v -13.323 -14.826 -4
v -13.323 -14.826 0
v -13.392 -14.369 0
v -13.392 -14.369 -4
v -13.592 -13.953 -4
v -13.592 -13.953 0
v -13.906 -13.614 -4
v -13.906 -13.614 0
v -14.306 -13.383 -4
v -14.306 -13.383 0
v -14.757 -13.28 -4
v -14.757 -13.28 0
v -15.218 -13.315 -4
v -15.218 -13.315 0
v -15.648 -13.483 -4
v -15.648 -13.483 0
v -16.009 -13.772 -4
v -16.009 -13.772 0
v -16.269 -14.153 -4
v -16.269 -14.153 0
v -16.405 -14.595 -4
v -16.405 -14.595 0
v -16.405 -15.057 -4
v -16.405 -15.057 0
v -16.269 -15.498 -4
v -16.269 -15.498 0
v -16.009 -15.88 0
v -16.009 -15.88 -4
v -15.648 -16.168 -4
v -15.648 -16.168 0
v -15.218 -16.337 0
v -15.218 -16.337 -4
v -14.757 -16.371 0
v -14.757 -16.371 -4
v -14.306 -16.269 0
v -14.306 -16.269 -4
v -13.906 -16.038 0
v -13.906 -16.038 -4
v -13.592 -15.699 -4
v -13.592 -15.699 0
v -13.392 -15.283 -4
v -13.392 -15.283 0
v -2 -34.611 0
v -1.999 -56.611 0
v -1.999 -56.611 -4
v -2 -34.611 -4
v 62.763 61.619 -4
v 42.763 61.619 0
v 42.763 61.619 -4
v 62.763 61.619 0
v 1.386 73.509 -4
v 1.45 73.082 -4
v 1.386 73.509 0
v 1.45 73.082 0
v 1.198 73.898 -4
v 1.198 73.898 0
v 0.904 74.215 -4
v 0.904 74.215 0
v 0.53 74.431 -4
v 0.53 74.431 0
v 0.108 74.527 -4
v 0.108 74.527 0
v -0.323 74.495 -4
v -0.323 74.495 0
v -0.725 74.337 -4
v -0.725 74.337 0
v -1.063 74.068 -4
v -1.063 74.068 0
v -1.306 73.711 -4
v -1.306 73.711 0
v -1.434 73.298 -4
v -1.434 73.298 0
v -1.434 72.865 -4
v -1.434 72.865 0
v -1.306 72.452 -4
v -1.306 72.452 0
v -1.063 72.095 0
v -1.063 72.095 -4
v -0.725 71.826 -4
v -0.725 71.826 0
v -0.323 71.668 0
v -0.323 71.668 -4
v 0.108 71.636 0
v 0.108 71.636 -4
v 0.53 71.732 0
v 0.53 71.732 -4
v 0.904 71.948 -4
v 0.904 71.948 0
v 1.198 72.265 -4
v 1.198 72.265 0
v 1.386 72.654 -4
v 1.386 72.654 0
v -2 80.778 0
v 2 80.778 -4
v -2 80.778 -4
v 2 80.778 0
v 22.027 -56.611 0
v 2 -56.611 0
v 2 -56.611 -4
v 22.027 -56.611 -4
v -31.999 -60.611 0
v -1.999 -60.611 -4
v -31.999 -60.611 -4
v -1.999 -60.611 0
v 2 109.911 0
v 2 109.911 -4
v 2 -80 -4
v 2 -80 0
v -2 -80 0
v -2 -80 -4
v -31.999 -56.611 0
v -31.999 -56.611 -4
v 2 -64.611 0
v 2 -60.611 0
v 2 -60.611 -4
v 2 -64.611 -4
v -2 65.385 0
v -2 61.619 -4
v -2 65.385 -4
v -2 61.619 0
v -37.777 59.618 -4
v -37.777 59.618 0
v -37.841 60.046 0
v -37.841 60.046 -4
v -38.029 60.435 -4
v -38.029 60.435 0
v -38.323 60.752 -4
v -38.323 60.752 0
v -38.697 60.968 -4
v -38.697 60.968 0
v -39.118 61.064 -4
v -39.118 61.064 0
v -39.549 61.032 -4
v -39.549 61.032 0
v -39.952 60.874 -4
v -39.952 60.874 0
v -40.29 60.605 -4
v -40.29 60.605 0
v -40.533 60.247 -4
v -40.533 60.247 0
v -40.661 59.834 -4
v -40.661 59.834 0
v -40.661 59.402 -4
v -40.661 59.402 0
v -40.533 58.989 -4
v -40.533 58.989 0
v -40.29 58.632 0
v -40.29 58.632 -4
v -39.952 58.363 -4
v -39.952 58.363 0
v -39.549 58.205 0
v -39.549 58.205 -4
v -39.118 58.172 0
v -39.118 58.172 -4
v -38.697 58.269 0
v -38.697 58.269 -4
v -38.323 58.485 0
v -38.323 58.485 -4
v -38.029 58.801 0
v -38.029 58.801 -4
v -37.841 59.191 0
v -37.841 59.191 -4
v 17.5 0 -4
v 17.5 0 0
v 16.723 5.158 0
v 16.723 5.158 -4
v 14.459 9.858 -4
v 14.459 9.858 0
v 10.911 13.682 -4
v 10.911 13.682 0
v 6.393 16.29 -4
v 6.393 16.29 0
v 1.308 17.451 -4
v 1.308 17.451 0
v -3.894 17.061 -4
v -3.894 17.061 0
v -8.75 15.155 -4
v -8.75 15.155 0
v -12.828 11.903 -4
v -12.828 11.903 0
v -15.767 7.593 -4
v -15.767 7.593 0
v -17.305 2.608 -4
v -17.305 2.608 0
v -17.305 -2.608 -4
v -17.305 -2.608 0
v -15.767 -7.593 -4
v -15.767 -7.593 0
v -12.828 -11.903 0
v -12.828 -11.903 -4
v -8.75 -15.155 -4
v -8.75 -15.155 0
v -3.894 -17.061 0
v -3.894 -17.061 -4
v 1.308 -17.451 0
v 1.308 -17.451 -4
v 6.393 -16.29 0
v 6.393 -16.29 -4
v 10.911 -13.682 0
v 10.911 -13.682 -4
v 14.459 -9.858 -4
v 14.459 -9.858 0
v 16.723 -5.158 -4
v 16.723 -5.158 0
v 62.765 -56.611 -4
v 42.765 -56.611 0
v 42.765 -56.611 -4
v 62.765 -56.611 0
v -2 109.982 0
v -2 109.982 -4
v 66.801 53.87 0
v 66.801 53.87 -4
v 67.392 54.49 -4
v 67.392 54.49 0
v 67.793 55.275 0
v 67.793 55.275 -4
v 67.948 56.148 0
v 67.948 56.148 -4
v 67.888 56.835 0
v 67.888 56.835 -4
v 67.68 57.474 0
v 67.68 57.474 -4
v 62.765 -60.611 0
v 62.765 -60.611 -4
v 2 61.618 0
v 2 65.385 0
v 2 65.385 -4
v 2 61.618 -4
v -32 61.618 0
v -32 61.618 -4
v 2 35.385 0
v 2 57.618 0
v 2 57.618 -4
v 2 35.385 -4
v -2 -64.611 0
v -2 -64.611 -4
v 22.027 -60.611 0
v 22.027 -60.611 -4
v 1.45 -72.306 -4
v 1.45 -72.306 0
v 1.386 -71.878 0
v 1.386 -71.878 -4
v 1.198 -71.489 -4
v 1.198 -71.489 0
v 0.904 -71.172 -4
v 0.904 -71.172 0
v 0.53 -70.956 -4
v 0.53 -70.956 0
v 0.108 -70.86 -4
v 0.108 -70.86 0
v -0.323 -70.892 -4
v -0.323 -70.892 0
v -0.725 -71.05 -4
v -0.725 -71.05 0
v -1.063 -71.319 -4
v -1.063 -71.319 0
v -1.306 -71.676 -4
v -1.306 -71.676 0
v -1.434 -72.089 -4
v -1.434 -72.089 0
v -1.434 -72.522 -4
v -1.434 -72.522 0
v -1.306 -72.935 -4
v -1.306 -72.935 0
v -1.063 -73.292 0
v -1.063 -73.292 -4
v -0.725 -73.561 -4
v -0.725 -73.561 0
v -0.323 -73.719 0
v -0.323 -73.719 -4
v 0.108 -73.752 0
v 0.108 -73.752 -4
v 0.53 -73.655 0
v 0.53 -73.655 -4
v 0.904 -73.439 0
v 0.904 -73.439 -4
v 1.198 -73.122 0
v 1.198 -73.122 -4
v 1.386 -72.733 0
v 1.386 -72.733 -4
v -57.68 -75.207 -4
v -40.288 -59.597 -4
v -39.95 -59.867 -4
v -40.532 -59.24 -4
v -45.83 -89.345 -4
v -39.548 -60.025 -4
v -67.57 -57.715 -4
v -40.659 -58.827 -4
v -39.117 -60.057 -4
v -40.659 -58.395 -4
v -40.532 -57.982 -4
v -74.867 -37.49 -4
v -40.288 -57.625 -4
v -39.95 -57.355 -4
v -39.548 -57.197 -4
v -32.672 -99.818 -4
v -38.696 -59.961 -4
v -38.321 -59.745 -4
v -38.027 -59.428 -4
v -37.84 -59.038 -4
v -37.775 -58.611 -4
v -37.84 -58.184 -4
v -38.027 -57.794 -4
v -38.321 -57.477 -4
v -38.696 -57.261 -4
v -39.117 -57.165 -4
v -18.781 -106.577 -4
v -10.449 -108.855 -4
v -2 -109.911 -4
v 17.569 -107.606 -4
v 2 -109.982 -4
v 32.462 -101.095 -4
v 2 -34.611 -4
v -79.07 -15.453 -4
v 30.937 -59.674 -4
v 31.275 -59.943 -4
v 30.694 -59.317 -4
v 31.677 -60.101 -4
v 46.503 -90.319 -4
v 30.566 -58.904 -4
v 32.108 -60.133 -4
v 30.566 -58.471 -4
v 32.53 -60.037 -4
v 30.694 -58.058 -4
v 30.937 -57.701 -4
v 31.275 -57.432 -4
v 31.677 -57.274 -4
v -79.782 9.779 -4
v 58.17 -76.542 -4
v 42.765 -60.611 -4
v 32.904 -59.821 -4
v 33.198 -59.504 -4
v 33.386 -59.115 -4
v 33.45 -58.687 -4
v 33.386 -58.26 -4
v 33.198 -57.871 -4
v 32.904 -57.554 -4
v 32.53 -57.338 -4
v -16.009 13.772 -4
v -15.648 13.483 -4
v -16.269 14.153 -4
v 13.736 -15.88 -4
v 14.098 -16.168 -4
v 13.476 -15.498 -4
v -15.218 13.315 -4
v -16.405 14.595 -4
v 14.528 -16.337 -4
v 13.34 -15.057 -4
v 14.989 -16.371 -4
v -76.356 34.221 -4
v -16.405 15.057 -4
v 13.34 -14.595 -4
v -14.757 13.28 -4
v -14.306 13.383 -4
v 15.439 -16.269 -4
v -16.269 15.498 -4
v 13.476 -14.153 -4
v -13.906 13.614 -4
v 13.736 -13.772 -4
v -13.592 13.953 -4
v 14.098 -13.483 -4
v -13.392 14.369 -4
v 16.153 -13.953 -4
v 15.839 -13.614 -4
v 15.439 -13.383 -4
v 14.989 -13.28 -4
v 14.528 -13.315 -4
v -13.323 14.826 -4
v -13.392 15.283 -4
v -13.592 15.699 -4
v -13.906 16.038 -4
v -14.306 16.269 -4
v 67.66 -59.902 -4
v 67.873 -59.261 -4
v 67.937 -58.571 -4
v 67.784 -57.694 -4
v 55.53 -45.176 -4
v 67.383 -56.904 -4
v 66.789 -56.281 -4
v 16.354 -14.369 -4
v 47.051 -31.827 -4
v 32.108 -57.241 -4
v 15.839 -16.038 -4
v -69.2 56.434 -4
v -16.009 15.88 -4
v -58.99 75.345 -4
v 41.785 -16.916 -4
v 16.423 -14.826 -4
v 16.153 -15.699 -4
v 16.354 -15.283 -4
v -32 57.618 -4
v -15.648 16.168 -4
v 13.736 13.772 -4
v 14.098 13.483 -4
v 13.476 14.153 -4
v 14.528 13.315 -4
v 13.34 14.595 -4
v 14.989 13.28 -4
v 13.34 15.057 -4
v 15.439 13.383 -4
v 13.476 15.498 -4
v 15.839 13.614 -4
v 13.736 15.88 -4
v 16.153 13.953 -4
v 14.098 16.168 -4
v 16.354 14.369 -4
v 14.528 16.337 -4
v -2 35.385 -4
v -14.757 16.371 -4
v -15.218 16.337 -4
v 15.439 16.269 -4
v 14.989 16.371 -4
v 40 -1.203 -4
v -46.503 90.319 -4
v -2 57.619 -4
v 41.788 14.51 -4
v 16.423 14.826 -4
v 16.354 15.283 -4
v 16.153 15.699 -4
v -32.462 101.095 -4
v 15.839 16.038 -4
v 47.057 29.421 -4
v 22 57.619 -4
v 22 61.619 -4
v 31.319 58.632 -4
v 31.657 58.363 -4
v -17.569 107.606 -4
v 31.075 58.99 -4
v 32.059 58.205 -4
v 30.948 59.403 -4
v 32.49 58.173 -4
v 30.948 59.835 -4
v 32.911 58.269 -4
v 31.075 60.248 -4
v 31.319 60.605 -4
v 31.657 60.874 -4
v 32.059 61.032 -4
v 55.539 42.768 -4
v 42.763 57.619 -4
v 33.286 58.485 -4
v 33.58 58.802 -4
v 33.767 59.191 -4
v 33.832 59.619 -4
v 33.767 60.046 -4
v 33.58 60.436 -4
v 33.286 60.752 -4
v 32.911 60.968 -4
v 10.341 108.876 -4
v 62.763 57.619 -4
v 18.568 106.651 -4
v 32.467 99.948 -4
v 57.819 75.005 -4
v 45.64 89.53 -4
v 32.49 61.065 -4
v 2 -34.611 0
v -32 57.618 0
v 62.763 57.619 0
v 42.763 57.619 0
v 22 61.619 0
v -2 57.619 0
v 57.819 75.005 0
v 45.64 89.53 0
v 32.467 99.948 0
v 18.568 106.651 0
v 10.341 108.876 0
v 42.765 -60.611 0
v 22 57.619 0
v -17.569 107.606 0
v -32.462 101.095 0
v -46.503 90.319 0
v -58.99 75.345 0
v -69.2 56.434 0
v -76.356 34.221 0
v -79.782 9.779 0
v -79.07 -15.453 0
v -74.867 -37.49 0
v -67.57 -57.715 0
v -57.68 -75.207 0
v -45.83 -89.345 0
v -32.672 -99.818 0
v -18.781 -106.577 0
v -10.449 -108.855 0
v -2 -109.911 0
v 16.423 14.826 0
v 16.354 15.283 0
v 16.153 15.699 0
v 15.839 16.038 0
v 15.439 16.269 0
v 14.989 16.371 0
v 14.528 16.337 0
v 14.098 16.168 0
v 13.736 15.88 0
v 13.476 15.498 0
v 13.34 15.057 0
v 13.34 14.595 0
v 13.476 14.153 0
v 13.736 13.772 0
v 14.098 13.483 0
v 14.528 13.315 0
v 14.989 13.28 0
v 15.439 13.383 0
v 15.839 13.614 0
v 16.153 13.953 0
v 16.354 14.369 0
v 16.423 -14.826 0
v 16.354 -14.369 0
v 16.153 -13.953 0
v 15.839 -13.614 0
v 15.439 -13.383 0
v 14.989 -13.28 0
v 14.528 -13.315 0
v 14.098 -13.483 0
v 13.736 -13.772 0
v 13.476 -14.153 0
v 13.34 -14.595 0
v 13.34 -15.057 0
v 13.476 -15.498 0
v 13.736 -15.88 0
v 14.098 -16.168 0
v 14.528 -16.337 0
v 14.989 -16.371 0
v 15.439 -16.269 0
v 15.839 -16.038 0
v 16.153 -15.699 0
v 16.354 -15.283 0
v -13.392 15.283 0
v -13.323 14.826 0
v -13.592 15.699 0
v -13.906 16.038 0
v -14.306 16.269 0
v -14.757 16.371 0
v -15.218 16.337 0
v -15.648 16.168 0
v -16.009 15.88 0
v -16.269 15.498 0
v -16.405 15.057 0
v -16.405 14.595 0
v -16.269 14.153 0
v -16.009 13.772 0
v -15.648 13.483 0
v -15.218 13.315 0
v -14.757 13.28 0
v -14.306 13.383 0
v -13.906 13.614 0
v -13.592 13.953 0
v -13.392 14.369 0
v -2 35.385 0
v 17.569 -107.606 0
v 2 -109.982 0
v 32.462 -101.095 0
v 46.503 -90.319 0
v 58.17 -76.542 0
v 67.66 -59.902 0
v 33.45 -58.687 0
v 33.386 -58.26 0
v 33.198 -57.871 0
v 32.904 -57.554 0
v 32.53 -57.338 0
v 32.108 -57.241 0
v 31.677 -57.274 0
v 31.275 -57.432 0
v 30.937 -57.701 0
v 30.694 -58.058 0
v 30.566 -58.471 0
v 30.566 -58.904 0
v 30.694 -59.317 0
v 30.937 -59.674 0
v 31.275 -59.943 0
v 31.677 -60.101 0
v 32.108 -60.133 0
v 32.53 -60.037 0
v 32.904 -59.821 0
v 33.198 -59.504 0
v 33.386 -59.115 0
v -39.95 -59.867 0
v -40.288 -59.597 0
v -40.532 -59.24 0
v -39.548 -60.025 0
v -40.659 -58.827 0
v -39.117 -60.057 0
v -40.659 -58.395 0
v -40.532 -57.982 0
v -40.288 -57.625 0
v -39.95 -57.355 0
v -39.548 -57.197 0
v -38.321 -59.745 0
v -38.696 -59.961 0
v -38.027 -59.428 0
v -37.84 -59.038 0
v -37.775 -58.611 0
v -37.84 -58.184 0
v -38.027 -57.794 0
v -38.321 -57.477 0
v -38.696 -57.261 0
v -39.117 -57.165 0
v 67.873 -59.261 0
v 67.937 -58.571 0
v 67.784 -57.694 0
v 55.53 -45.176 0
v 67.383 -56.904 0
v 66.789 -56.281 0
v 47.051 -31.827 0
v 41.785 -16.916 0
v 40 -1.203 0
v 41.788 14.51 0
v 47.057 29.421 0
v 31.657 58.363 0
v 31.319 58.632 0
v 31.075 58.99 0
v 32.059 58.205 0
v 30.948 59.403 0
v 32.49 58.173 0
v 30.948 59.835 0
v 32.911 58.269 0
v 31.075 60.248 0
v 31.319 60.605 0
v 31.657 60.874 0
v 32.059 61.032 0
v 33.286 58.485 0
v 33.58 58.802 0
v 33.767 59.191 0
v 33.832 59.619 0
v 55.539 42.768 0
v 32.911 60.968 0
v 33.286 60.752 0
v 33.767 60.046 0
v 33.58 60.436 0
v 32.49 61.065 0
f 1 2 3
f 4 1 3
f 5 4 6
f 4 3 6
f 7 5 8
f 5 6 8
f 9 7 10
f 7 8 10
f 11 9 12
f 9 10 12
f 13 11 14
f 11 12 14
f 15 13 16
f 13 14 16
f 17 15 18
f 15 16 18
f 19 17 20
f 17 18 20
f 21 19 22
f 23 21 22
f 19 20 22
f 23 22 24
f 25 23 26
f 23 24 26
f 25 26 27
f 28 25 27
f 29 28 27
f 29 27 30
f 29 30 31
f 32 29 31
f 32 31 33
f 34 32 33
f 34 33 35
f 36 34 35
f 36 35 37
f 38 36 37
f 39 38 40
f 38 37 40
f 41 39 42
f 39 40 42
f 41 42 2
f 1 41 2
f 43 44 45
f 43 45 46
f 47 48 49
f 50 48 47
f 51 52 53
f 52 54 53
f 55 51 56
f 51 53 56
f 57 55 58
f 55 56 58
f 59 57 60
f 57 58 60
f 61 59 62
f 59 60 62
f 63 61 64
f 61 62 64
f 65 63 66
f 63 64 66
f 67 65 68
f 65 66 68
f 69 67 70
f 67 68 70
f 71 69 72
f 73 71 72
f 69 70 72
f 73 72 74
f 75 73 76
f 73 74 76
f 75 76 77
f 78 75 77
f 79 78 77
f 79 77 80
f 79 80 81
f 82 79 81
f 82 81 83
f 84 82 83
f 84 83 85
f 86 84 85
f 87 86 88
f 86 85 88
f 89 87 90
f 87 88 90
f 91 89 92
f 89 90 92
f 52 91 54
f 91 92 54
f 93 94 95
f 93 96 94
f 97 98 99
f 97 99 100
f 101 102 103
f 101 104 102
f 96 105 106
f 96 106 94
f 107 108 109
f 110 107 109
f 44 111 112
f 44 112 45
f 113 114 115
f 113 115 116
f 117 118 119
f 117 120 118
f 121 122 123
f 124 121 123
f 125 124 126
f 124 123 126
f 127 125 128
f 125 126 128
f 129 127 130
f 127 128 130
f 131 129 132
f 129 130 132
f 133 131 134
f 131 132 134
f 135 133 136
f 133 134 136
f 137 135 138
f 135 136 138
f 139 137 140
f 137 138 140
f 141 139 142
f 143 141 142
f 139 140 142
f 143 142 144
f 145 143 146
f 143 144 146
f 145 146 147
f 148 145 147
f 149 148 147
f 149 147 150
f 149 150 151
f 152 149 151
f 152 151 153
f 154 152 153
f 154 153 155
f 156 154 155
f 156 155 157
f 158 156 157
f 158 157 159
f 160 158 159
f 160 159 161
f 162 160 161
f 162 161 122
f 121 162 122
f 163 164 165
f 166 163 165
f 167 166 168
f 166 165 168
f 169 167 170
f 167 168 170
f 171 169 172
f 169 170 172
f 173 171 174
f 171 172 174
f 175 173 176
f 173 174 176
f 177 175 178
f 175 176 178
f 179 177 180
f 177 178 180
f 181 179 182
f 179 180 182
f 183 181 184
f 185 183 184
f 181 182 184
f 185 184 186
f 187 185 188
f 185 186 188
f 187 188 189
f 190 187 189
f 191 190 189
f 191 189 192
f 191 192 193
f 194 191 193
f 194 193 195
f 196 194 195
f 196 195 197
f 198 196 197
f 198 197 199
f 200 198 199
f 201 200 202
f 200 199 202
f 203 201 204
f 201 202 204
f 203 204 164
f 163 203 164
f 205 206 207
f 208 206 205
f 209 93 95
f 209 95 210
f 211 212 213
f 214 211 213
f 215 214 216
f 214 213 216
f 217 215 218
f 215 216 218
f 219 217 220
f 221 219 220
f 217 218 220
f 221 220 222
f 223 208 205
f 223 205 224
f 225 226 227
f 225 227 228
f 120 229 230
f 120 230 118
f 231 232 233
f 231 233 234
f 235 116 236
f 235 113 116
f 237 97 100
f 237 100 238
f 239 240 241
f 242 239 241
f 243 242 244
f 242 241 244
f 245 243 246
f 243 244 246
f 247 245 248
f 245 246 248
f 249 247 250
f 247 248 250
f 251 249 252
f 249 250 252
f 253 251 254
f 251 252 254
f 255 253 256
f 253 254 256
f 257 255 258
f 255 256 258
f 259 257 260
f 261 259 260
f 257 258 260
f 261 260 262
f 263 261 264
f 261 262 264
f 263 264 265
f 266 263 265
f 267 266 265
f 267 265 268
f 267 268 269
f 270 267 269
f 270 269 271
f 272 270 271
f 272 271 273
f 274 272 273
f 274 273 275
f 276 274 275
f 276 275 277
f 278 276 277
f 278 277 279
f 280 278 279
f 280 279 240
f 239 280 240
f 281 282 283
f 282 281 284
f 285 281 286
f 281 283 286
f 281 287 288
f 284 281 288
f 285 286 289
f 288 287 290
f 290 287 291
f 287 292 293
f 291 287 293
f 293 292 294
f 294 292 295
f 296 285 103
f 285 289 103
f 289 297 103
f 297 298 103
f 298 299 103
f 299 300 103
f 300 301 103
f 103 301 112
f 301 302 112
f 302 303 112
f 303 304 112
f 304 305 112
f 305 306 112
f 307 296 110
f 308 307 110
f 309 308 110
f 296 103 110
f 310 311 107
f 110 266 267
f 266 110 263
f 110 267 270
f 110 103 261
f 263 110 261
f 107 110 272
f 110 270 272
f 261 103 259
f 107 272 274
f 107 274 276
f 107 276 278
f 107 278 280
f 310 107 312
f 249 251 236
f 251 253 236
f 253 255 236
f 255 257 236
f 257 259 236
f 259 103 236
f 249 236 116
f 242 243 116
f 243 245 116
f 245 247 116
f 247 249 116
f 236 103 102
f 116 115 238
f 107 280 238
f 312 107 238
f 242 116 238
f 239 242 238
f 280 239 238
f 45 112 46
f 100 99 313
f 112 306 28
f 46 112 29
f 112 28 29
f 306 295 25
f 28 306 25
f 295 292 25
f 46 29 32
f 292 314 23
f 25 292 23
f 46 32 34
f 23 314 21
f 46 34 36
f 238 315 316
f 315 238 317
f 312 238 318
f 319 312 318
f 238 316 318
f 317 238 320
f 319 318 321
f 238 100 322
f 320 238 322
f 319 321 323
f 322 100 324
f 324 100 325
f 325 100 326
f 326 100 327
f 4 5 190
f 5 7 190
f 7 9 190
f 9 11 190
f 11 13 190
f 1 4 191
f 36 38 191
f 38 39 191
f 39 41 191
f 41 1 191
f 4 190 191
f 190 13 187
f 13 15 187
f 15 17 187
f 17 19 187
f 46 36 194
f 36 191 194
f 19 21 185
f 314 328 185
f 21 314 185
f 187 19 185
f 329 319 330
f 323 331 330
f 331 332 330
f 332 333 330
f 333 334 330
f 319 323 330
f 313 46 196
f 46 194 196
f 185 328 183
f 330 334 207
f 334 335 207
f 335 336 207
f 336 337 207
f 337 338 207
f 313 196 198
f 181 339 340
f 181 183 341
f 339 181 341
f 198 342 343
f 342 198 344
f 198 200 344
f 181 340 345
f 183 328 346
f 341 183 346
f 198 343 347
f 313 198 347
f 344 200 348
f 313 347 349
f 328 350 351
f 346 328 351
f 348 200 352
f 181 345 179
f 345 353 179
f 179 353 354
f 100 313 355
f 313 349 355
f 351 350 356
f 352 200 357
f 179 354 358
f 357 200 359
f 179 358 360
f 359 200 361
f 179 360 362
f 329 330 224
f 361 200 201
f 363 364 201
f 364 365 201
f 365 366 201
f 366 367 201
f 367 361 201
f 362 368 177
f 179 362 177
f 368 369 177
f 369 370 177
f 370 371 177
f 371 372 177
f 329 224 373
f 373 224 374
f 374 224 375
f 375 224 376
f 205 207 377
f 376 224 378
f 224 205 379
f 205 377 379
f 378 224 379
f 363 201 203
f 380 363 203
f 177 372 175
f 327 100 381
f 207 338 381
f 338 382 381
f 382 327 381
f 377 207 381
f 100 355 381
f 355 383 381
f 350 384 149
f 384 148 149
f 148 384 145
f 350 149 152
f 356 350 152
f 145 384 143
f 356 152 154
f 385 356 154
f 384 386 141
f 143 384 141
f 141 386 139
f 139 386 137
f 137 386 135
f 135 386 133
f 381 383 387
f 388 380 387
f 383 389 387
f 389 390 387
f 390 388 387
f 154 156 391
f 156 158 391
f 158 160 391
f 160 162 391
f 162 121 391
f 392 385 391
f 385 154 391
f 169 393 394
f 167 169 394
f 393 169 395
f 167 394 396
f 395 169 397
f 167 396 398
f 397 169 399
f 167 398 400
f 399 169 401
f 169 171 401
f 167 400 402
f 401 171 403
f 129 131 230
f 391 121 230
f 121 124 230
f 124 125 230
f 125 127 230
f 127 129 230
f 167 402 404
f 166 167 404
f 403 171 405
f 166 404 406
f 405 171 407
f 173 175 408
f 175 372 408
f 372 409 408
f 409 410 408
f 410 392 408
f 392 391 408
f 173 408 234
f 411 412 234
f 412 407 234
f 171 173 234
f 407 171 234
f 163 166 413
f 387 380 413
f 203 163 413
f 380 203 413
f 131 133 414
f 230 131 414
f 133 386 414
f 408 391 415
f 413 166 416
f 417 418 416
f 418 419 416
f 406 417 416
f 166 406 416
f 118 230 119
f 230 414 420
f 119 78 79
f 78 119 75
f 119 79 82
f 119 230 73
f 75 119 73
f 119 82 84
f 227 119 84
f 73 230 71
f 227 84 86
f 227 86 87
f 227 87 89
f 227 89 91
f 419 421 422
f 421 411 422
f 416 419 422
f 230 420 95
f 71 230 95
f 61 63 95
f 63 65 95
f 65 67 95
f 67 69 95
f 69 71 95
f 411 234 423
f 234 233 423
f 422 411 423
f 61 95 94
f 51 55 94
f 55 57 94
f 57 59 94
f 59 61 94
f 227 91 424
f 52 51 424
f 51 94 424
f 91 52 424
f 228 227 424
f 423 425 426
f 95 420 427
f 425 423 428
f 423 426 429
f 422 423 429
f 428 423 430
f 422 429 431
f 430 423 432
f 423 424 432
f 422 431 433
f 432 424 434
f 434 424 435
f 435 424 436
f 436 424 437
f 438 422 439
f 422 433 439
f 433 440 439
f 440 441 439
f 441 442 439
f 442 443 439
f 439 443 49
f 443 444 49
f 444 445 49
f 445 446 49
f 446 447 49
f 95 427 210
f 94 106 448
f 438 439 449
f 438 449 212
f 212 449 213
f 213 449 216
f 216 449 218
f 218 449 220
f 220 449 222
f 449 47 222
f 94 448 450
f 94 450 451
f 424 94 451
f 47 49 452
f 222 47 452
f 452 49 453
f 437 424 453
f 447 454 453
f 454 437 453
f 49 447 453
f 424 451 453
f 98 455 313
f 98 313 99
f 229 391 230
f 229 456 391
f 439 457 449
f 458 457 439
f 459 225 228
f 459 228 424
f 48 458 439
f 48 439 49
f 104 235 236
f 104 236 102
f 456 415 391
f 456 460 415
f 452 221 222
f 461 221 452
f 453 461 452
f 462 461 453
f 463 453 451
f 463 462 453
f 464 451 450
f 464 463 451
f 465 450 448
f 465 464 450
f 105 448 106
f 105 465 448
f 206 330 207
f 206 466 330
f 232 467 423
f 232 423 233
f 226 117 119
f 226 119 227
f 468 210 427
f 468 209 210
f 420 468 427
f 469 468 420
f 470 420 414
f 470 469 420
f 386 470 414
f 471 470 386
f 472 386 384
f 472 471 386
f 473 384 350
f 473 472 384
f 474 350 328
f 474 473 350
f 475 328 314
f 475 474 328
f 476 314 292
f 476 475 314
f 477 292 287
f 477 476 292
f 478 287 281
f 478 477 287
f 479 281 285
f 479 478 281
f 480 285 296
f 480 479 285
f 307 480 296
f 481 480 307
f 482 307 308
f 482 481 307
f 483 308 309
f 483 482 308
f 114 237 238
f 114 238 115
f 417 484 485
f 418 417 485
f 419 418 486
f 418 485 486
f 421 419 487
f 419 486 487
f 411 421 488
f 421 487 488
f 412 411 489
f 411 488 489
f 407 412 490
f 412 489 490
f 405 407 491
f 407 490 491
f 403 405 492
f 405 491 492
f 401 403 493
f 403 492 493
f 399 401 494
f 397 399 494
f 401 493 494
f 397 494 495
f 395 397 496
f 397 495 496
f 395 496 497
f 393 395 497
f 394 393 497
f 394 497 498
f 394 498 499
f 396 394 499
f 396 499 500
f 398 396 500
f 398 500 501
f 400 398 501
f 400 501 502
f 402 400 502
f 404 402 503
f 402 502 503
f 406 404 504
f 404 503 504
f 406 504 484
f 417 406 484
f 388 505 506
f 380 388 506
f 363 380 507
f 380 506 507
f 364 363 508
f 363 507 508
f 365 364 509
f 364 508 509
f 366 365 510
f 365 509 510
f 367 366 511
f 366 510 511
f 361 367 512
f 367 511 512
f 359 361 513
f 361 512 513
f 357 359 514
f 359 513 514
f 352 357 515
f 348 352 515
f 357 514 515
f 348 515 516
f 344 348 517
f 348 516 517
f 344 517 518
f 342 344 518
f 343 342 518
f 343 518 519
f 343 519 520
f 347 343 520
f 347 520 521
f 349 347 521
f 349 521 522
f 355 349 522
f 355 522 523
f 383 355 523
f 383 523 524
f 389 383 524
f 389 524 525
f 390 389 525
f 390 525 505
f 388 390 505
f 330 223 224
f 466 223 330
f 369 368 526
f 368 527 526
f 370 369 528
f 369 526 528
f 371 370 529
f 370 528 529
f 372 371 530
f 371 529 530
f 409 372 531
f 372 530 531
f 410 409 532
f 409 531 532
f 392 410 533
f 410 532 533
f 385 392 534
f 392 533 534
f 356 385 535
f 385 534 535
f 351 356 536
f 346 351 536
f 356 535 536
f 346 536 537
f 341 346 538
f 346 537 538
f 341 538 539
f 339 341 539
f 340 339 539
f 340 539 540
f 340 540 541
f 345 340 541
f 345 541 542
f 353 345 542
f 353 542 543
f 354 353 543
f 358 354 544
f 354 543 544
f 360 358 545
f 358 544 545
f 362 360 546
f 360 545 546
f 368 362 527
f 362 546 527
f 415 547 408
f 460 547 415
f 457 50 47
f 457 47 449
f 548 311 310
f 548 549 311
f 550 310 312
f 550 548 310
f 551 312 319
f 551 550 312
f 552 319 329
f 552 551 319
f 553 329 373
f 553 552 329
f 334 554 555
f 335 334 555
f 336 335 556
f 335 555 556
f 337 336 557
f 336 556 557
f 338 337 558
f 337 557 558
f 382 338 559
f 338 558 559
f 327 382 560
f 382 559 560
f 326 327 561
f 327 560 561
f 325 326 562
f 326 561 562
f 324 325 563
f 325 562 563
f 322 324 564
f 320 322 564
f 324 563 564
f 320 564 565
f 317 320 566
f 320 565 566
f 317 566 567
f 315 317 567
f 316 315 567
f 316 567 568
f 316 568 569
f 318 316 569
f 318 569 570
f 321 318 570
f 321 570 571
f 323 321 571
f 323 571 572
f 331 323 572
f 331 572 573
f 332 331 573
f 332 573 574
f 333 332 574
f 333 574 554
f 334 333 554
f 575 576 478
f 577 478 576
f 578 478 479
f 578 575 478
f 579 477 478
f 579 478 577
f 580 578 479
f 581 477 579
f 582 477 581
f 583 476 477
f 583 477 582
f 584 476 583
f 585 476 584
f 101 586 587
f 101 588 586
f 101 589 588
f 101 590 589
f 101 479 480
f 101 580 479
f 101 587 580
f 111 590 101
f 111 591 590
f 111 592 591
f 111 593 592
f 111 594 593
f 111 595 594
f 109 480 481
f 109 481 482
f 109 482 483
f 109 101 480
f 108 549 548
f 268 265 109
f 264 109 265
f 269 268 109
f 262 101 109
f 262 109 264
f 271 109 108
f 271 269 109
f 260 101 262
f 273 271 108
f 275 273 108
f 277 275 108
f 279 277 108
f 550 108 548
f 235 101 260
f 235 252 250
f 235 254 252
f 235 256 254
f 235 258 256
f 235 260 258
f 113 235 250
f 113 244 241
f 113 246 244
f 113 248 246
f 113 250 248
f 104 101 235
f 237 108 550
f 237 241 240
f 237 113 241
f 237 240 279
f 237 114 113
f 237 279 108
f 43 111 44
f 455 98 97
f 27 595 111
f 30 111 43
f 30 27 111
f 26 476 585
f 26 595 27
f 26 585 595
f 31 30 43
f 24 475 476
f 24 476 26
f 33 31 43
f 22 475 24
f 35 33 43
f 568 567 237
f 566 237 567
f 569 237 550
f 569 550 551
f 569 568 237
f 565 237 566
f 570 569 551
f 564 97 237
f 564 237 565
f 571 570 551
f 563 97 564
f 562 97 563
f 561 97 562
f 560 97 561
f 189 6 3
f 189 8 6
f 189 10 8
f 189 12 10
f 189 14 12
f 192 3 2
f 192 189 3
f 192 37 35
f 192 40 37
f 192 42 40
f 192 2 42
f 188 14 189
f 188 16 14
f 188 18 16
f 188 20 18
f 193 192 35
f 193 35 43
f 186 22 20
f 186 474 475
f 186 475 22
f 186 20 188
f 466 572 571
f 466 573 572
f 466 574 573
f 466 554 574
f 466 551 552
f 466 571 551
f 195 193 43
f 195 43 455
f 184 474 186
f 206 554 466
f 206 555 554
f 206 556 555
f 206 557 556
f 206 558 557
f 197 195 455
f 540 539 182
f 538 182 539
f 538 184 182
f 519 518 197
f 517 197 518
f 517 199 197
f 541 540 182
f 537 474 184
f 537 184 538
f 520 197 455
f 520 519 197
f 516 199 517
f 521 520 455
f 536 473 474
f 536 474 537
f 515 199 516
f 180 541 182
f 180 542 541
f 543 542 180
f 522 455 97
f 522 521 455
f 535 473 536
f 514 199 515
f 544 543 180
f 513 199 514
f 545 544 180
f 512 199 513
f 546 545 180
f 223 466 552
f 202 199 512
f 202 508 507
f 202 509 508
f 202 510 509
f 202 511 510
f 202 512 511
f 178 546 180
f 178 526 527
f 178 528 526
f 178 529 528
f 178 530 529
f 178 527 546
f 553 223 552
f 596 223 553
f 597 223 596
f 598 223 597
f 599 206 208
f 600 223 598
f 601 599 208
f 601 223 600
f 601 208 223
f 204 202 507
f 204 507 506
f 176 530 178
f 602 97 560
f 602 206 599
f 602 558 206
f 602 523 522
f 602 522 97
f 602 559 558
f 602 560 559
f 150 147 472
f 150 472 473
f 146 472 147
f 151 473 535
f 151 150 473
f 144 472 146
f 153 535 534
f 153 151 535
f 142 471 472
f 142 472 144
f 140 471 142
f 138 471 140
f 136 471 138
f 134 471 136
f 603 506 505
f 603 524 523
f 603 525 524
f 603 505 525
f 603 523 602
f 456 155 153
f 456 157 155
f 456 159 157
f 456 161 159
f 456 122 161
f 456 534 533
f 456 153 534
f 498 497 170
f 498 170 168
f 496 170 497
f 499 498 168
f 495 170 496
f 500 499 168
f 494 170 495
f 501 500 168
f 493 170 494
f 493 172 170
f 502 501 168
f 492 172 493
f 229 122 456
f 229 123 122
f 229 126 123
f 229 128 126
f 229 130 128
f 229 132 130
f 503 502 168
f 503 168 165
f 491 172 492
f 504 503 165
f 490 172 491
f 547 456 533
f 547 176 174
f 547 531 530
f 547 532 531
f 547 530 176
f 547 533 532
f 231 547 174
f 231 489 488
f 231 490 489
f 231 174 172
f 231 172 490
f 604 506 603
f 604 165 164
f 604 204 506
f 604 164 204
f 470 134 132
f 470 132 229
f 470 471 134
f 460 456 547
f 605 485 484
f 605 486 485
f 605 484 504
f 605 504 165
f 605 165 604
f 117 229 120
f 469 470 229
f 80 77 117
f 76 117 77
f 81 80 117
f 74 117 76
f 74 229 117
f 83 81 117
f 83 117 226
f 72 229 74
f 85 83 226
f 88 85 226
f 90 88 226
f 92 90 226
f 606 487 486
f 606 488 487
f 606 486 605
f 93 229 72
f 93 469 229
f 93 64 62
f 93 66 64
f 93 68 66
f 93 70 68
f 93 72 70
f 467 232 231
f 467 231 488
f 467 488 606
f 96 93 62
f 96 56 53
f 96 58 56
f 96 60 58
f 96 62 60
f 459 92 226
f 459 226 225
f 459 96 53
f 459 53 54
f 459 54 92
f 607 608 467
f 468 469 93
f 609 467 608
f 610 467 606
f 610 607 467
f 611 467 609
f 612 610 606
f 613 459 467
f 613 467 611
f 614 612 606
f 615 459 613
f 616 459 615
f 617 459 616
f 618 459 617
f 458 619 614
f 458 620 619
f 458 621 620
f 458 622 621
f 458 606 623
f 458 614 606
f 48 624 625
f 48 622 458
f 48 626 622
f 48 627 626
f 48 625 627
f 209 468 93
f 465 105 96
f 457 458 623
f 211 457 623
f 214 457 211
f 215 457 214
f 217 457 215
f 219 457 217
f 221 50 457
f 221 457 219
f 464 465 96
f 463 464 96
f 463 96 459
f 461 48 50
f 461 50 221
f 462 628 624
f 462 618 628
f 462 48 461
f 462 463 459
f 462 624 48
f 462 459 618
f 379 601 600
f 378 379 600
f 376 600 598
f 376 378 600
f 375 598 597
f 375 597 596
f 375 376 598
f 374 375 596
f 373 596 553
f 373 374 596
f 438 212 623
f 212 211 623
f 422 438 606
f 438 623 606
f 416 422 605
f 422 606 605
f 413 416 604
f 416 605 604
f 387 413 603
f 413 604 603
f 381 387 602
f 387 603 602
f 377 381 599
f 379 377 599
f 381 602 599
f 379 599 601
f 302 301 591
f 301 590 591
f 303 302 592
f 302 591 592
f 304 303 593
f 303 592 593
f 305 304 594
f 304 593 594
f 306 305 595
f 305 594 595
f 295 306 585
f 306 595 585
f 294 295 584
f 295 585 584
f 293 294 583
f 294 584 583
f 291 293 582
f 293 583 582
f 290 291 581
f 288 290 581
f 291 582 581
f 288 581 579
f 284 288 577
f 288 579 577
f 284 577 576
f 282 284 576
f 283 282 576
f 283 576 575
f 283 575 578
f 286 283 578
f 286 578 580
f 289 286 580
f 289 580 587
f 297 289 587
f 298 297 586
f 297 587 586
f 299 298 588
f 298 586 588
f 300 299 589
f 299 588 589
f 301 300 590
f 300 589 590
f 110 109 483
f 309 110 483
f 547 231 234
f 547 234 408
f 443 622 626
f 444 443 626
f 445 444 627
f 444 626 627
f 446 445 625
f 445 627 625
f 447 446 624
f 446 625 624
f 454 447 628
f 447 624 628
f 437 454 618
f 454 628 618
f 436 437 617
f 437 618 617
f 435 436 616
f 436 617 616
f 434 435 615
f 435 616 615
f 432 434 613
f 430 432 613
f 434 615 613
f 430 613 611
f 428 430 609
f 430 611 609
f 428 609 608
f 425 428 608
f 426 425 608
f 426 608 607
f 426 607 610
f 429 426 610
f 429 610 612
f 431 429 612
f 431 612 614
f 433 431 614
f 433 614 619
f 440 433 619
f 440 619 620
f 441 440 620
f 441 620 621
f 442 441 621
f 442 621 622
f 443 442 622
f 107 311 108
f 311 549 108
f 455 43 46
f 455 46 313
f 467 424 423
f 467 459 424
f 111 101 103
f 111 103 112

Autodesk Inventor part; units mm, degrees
ref_plane "YZ Plane" through (0, 0, 0) normal (1, 0, 0) x (0, 1, 0)
ref_plane "XZ Plane" through (0, 0, 0) normal (0, 1, 0) x (-1, 0, 0)
ref_plane "XY Plane" through (0, 0, 0) normal (0, 0, 1) x (1, 0, 0)
sketch "Эскиз1" plane through (0, 0, 0) normal (0, 0, 1) x (1, 0, 0)
  ellipse E0 centre (0, 0) end of major axis (2.1776, -109.9784) minor radius 80 (68.6548, 55.2754) -> (68.6548, -57.6949) ccw
  circle A0 centre (0, 0) radius 17.5
  line L0 (-129.1764, 146.988) -> (-129.1764, 142.988) construction
  line L1 (-149.1764, 146.9879) -> (-129.1764, 146.988) construction
  line L2 (-149.1764, 142.9879) -> (-149.1764, 146.9879) construction
  line L3 (-129.1764, 142.988) -> (-149.1764, 142.9879) construction
  line L4 (-169.9145, 146.9879) -> (-169.9145, 142.9879) construction
  line L5 (-189.9145, 146.9878) -> (-169.9145, 146.9879) construction
  line L6 (-189.9145, 142.9878) -> (-189.9145, 146.9878) construction
  line L7 (-169.9145, 142.9879) -> (-189.9145, 142.9878) construction
  arc A1 (68.6548, 55.2754) -> (68.6548, -57.6949) centre (110, -1.2098) ccw
  line L8 (68.6548, 55.2754) -> (68.6548, -57.6949) construction
  line L9 (0, 109.9808) -> (0, -109.9808) construction
  line L10 (-2, -110) -> (2, -110)
  line L11 (2, -110) -> (2, -80)
  line L12 (2, -80) -> (-2, -80)
  line L13 (-2, -80) -> (-2, -110)
  line L14 (2, -110) -> (-2, -80) construction
  point P0 (0, -95)
  point P1 (0, -110)
  point P2 (-2, -109.9112)
  point P3 (2, -109.9817)
  dimension "d0" = 110
  dimension "d1" = 80
  dimension "d4" = 35
  dimension "d19" = 70
  dimension "d21" = 110
  dimension "d24" = 4
  dimension "d25" = 30
  dimension "d26" = 110
extrude "Выдавливание1" add sketch "Эскиз1" against normal blind 4 contours A1 E0 L11 L12 L13
fillet "Сопряжение1" radius 3 2 edges at (68.6548, 55.2754, -2) (68.6548, -57.6949, -2)
sketch "Эскиз5" plane through (0, 0, 0) normal (0, 0, 1) x (1, 0, 0)
  line L0 (-2, -110) -> (-2, -80)
  line L1 (-2, -80) -> (2, -80)
  line L2 (2, -80) -> (2, -110)
  line L3 (2, -110) -> (-2, -110)
  line L4 (-2, -34.6112) -> (2, -34.6112)
  line L5 (2, -64.6112) -> (-2, -64.6112)
  line L6 (-2, 65.3852) -> (2, 65.3852)
  line L7 (2, 35.3852) -> (-2, 35.3852)
  line L8 (-2, 80.7779) -> (-2, 110.7779)
  line L9 (-2, 110.7779) -> (2, 110.7779)
  line L10 (2, 110.7779) -> (2, 80.7779)
  line L11 (2, 80.7779) -> (-2, 80.7779)
  line L12 (-49.2252, -56.6111) -> (-46.452, -56.6111) construction
  line L13 (-46.452, -56.6111) -> (-46.452, -60.6111) construction
  line L14 (-46.452, -60.6111) -> (-49.2252, -60.6111) construction
  line L15 (-49.2252, -56.6111) -> (-49.2252, -60.6111) construction
  line L16 (-1.9986, -60.6111) -> (-31.9986, -60.6111)
  line L17 (-31.9986, -60.6111) -> (-31.9986, -56.6111)
  line L18 (-31.9986, -56.6111) -> (-1.9986, -56.6111)
  line L19 (2, -56.6111) -> (22.0269, -56.6111)
  line L20 (22.0269, -56.6111) -> (22.0269, -60.6111)
  line L21 (22.0269, -60.6111) -> (2, -60.6111)
  line L22 (42.765, -56.6111) -> (62.765, -56.6111)
  line L23 (62.765, -56.6111) -> (62.765, -60.6111)
  line L24 (62.765, -60.6111) -> (42.765, -60.6111)
  line L25 (42.765, -60.6111) -> (42.765, -56.6111)
  line L26 (-46.4535, 57.6183) -> (-49.2267, 57.6183) construction
  line L27 (-49.2267, 61.6183) -> (-49.2267, 57.6183) construction
  line L28 (-49.2267, 61.6183) -> (-46.4535, 61.6183) construction
  line L29 (-46.4535, 61.6183) -> (-46.4535, 57.6183) construction
  line L30 (-32.0001, 61.6183) -> (2, 61.6183)
  line L31 (-2.0001, 57.6186) -> (-2.0001, 57.6183)
  line L32 (2, 57.6183) -> (-32.0001, 57.6183)
  line L33 (-32.0001, 57.6183) -> (-32.0001, 61.6183)
  line L34 (62.7634, 61.6188) -> (62.7634, 57.6188)
  line L35 (42.7634, 61.6188) -> (62.7634, 61.6188)
  line L36 (62.7634, 57.6188) -> (42.7634, 57.6188)
  line L37 (42.7634, 57.6188) -> (42.7634, 61.6188)
  line L38 (22, 61.6187) -> (22, 57.6187)
  line L39 (22, 57.6187) -> (-2, 57.6186)
  line L40 (-2, 61.6186) -> (22, 61.6187)
  line L41 (-31.9986, -56.6111) -> (-46.452, -60.6111) construction
  circle A0 centre (-39.2253, -58.6111) radius 1.45
  line L42 (-2, -64.6112) -> (2, -80) construction
  circle A1 centre (0, -72.3056) radius 1.45
  line L43 (-46.4535, 57.6183) -> (-32.0001, 61.6183) construction
  circle A2 centre (-39.2268, 59.6183) radius 1.45
  line L44 (-2, 35.3852) -> (-2, 57.6186)
  line L45 (-2, 61.6183) -> (-2, 65.3852)
  line L46 (-2, -64.6112) -> (-2, -60.6111)
  line L47 (-2, -56.6111) -> (-2, -34.6112)
  line L48 (2, -34.6112) -> (2, -56.6111)
  line L49 (2, -60.6111) -> (2, -64.6112)
  line L50 (2, 65.3852) -> (2, 61.6186)
  line L51 (2, 57.6186) -> (2, 35.3852)
  line L52 (-2, 80.7779) -> (2, 65.3852) construction
  circle A3 centre (0, 73.0815) radius 1.45
  line L53 (2, 61.6186) -> (2, 57.6186)
  line L54 (-2, 57.6186) -> (-2, 61.6183)
  line L55 (2, -56.6111) -> (2, -60.6111)
  line L56 (-2, -60.6111) -> (-2, -56.6111)
  line L57 (42.7634, 61.6188) -> (22, 57.6187) construction
  circle A4 centre (32.3817, 59.6187) radius 1.45
  line L58 (42.765, -56.6111) -> (22.0269, -60.6111) construction
  circle A5 centre (32, -58.6874) radius 1.45
  point P0 (0, 0)
  point P1 (-2, 57.6183)
  dimension "d33" = 2.9
  dimension "d34" = 2.9
  dimension "d35" = 2.9
  dimension "d36" = 2.9
  dimension "d37" = 2.9
  dimension "d38" = 2.9
extrude "Выдавливание3" cut sketch "Эскиз5" against normal blind 4
sketch "Эскиз8" plane through (0, 0, 0) normal (0, 0, 1) x (1, 0, 0)
  circle A0 centre (14.8727, 14.8258) radius 1.55
  circle A1 centre (-14.8727, -14.8258) radius 1.55
  line L0 (0, 0) -> (0, 17.5) construction
  circle A2 centre (0, 0) radius 17.5 construction
  line L1 (-14.8727, -14.8258) -> (14.8727, -14.8258) construction
  line L2 (14.8727, -14.8258) -> (14.8727, 14.8258) construction
  line L3 (14.8727, 14.8258) -> (-14.8727, 14.8258) construction
  line L4 (-14.8727, 14.8258) -> (-14.8727, -14.8258) construction
  line L5 (-14.8727, -14.8258) -> (14.8727, 14.8258) construction
  circle A3 centre (-14.8727, 14.8258) radius 1.55
  circle A4 centre (14.8727, -14.8258) radius 1.55
  dimension "d39" = 3.1
  dimension "d40" = 3.1
  dimension "d46" = 3.1
  dimension "d47" = 3.1
extrude "Выдавливание6" cut sketch "Эскиз8" against normal blind 10
properties part number "верхний эллипс туловища"
